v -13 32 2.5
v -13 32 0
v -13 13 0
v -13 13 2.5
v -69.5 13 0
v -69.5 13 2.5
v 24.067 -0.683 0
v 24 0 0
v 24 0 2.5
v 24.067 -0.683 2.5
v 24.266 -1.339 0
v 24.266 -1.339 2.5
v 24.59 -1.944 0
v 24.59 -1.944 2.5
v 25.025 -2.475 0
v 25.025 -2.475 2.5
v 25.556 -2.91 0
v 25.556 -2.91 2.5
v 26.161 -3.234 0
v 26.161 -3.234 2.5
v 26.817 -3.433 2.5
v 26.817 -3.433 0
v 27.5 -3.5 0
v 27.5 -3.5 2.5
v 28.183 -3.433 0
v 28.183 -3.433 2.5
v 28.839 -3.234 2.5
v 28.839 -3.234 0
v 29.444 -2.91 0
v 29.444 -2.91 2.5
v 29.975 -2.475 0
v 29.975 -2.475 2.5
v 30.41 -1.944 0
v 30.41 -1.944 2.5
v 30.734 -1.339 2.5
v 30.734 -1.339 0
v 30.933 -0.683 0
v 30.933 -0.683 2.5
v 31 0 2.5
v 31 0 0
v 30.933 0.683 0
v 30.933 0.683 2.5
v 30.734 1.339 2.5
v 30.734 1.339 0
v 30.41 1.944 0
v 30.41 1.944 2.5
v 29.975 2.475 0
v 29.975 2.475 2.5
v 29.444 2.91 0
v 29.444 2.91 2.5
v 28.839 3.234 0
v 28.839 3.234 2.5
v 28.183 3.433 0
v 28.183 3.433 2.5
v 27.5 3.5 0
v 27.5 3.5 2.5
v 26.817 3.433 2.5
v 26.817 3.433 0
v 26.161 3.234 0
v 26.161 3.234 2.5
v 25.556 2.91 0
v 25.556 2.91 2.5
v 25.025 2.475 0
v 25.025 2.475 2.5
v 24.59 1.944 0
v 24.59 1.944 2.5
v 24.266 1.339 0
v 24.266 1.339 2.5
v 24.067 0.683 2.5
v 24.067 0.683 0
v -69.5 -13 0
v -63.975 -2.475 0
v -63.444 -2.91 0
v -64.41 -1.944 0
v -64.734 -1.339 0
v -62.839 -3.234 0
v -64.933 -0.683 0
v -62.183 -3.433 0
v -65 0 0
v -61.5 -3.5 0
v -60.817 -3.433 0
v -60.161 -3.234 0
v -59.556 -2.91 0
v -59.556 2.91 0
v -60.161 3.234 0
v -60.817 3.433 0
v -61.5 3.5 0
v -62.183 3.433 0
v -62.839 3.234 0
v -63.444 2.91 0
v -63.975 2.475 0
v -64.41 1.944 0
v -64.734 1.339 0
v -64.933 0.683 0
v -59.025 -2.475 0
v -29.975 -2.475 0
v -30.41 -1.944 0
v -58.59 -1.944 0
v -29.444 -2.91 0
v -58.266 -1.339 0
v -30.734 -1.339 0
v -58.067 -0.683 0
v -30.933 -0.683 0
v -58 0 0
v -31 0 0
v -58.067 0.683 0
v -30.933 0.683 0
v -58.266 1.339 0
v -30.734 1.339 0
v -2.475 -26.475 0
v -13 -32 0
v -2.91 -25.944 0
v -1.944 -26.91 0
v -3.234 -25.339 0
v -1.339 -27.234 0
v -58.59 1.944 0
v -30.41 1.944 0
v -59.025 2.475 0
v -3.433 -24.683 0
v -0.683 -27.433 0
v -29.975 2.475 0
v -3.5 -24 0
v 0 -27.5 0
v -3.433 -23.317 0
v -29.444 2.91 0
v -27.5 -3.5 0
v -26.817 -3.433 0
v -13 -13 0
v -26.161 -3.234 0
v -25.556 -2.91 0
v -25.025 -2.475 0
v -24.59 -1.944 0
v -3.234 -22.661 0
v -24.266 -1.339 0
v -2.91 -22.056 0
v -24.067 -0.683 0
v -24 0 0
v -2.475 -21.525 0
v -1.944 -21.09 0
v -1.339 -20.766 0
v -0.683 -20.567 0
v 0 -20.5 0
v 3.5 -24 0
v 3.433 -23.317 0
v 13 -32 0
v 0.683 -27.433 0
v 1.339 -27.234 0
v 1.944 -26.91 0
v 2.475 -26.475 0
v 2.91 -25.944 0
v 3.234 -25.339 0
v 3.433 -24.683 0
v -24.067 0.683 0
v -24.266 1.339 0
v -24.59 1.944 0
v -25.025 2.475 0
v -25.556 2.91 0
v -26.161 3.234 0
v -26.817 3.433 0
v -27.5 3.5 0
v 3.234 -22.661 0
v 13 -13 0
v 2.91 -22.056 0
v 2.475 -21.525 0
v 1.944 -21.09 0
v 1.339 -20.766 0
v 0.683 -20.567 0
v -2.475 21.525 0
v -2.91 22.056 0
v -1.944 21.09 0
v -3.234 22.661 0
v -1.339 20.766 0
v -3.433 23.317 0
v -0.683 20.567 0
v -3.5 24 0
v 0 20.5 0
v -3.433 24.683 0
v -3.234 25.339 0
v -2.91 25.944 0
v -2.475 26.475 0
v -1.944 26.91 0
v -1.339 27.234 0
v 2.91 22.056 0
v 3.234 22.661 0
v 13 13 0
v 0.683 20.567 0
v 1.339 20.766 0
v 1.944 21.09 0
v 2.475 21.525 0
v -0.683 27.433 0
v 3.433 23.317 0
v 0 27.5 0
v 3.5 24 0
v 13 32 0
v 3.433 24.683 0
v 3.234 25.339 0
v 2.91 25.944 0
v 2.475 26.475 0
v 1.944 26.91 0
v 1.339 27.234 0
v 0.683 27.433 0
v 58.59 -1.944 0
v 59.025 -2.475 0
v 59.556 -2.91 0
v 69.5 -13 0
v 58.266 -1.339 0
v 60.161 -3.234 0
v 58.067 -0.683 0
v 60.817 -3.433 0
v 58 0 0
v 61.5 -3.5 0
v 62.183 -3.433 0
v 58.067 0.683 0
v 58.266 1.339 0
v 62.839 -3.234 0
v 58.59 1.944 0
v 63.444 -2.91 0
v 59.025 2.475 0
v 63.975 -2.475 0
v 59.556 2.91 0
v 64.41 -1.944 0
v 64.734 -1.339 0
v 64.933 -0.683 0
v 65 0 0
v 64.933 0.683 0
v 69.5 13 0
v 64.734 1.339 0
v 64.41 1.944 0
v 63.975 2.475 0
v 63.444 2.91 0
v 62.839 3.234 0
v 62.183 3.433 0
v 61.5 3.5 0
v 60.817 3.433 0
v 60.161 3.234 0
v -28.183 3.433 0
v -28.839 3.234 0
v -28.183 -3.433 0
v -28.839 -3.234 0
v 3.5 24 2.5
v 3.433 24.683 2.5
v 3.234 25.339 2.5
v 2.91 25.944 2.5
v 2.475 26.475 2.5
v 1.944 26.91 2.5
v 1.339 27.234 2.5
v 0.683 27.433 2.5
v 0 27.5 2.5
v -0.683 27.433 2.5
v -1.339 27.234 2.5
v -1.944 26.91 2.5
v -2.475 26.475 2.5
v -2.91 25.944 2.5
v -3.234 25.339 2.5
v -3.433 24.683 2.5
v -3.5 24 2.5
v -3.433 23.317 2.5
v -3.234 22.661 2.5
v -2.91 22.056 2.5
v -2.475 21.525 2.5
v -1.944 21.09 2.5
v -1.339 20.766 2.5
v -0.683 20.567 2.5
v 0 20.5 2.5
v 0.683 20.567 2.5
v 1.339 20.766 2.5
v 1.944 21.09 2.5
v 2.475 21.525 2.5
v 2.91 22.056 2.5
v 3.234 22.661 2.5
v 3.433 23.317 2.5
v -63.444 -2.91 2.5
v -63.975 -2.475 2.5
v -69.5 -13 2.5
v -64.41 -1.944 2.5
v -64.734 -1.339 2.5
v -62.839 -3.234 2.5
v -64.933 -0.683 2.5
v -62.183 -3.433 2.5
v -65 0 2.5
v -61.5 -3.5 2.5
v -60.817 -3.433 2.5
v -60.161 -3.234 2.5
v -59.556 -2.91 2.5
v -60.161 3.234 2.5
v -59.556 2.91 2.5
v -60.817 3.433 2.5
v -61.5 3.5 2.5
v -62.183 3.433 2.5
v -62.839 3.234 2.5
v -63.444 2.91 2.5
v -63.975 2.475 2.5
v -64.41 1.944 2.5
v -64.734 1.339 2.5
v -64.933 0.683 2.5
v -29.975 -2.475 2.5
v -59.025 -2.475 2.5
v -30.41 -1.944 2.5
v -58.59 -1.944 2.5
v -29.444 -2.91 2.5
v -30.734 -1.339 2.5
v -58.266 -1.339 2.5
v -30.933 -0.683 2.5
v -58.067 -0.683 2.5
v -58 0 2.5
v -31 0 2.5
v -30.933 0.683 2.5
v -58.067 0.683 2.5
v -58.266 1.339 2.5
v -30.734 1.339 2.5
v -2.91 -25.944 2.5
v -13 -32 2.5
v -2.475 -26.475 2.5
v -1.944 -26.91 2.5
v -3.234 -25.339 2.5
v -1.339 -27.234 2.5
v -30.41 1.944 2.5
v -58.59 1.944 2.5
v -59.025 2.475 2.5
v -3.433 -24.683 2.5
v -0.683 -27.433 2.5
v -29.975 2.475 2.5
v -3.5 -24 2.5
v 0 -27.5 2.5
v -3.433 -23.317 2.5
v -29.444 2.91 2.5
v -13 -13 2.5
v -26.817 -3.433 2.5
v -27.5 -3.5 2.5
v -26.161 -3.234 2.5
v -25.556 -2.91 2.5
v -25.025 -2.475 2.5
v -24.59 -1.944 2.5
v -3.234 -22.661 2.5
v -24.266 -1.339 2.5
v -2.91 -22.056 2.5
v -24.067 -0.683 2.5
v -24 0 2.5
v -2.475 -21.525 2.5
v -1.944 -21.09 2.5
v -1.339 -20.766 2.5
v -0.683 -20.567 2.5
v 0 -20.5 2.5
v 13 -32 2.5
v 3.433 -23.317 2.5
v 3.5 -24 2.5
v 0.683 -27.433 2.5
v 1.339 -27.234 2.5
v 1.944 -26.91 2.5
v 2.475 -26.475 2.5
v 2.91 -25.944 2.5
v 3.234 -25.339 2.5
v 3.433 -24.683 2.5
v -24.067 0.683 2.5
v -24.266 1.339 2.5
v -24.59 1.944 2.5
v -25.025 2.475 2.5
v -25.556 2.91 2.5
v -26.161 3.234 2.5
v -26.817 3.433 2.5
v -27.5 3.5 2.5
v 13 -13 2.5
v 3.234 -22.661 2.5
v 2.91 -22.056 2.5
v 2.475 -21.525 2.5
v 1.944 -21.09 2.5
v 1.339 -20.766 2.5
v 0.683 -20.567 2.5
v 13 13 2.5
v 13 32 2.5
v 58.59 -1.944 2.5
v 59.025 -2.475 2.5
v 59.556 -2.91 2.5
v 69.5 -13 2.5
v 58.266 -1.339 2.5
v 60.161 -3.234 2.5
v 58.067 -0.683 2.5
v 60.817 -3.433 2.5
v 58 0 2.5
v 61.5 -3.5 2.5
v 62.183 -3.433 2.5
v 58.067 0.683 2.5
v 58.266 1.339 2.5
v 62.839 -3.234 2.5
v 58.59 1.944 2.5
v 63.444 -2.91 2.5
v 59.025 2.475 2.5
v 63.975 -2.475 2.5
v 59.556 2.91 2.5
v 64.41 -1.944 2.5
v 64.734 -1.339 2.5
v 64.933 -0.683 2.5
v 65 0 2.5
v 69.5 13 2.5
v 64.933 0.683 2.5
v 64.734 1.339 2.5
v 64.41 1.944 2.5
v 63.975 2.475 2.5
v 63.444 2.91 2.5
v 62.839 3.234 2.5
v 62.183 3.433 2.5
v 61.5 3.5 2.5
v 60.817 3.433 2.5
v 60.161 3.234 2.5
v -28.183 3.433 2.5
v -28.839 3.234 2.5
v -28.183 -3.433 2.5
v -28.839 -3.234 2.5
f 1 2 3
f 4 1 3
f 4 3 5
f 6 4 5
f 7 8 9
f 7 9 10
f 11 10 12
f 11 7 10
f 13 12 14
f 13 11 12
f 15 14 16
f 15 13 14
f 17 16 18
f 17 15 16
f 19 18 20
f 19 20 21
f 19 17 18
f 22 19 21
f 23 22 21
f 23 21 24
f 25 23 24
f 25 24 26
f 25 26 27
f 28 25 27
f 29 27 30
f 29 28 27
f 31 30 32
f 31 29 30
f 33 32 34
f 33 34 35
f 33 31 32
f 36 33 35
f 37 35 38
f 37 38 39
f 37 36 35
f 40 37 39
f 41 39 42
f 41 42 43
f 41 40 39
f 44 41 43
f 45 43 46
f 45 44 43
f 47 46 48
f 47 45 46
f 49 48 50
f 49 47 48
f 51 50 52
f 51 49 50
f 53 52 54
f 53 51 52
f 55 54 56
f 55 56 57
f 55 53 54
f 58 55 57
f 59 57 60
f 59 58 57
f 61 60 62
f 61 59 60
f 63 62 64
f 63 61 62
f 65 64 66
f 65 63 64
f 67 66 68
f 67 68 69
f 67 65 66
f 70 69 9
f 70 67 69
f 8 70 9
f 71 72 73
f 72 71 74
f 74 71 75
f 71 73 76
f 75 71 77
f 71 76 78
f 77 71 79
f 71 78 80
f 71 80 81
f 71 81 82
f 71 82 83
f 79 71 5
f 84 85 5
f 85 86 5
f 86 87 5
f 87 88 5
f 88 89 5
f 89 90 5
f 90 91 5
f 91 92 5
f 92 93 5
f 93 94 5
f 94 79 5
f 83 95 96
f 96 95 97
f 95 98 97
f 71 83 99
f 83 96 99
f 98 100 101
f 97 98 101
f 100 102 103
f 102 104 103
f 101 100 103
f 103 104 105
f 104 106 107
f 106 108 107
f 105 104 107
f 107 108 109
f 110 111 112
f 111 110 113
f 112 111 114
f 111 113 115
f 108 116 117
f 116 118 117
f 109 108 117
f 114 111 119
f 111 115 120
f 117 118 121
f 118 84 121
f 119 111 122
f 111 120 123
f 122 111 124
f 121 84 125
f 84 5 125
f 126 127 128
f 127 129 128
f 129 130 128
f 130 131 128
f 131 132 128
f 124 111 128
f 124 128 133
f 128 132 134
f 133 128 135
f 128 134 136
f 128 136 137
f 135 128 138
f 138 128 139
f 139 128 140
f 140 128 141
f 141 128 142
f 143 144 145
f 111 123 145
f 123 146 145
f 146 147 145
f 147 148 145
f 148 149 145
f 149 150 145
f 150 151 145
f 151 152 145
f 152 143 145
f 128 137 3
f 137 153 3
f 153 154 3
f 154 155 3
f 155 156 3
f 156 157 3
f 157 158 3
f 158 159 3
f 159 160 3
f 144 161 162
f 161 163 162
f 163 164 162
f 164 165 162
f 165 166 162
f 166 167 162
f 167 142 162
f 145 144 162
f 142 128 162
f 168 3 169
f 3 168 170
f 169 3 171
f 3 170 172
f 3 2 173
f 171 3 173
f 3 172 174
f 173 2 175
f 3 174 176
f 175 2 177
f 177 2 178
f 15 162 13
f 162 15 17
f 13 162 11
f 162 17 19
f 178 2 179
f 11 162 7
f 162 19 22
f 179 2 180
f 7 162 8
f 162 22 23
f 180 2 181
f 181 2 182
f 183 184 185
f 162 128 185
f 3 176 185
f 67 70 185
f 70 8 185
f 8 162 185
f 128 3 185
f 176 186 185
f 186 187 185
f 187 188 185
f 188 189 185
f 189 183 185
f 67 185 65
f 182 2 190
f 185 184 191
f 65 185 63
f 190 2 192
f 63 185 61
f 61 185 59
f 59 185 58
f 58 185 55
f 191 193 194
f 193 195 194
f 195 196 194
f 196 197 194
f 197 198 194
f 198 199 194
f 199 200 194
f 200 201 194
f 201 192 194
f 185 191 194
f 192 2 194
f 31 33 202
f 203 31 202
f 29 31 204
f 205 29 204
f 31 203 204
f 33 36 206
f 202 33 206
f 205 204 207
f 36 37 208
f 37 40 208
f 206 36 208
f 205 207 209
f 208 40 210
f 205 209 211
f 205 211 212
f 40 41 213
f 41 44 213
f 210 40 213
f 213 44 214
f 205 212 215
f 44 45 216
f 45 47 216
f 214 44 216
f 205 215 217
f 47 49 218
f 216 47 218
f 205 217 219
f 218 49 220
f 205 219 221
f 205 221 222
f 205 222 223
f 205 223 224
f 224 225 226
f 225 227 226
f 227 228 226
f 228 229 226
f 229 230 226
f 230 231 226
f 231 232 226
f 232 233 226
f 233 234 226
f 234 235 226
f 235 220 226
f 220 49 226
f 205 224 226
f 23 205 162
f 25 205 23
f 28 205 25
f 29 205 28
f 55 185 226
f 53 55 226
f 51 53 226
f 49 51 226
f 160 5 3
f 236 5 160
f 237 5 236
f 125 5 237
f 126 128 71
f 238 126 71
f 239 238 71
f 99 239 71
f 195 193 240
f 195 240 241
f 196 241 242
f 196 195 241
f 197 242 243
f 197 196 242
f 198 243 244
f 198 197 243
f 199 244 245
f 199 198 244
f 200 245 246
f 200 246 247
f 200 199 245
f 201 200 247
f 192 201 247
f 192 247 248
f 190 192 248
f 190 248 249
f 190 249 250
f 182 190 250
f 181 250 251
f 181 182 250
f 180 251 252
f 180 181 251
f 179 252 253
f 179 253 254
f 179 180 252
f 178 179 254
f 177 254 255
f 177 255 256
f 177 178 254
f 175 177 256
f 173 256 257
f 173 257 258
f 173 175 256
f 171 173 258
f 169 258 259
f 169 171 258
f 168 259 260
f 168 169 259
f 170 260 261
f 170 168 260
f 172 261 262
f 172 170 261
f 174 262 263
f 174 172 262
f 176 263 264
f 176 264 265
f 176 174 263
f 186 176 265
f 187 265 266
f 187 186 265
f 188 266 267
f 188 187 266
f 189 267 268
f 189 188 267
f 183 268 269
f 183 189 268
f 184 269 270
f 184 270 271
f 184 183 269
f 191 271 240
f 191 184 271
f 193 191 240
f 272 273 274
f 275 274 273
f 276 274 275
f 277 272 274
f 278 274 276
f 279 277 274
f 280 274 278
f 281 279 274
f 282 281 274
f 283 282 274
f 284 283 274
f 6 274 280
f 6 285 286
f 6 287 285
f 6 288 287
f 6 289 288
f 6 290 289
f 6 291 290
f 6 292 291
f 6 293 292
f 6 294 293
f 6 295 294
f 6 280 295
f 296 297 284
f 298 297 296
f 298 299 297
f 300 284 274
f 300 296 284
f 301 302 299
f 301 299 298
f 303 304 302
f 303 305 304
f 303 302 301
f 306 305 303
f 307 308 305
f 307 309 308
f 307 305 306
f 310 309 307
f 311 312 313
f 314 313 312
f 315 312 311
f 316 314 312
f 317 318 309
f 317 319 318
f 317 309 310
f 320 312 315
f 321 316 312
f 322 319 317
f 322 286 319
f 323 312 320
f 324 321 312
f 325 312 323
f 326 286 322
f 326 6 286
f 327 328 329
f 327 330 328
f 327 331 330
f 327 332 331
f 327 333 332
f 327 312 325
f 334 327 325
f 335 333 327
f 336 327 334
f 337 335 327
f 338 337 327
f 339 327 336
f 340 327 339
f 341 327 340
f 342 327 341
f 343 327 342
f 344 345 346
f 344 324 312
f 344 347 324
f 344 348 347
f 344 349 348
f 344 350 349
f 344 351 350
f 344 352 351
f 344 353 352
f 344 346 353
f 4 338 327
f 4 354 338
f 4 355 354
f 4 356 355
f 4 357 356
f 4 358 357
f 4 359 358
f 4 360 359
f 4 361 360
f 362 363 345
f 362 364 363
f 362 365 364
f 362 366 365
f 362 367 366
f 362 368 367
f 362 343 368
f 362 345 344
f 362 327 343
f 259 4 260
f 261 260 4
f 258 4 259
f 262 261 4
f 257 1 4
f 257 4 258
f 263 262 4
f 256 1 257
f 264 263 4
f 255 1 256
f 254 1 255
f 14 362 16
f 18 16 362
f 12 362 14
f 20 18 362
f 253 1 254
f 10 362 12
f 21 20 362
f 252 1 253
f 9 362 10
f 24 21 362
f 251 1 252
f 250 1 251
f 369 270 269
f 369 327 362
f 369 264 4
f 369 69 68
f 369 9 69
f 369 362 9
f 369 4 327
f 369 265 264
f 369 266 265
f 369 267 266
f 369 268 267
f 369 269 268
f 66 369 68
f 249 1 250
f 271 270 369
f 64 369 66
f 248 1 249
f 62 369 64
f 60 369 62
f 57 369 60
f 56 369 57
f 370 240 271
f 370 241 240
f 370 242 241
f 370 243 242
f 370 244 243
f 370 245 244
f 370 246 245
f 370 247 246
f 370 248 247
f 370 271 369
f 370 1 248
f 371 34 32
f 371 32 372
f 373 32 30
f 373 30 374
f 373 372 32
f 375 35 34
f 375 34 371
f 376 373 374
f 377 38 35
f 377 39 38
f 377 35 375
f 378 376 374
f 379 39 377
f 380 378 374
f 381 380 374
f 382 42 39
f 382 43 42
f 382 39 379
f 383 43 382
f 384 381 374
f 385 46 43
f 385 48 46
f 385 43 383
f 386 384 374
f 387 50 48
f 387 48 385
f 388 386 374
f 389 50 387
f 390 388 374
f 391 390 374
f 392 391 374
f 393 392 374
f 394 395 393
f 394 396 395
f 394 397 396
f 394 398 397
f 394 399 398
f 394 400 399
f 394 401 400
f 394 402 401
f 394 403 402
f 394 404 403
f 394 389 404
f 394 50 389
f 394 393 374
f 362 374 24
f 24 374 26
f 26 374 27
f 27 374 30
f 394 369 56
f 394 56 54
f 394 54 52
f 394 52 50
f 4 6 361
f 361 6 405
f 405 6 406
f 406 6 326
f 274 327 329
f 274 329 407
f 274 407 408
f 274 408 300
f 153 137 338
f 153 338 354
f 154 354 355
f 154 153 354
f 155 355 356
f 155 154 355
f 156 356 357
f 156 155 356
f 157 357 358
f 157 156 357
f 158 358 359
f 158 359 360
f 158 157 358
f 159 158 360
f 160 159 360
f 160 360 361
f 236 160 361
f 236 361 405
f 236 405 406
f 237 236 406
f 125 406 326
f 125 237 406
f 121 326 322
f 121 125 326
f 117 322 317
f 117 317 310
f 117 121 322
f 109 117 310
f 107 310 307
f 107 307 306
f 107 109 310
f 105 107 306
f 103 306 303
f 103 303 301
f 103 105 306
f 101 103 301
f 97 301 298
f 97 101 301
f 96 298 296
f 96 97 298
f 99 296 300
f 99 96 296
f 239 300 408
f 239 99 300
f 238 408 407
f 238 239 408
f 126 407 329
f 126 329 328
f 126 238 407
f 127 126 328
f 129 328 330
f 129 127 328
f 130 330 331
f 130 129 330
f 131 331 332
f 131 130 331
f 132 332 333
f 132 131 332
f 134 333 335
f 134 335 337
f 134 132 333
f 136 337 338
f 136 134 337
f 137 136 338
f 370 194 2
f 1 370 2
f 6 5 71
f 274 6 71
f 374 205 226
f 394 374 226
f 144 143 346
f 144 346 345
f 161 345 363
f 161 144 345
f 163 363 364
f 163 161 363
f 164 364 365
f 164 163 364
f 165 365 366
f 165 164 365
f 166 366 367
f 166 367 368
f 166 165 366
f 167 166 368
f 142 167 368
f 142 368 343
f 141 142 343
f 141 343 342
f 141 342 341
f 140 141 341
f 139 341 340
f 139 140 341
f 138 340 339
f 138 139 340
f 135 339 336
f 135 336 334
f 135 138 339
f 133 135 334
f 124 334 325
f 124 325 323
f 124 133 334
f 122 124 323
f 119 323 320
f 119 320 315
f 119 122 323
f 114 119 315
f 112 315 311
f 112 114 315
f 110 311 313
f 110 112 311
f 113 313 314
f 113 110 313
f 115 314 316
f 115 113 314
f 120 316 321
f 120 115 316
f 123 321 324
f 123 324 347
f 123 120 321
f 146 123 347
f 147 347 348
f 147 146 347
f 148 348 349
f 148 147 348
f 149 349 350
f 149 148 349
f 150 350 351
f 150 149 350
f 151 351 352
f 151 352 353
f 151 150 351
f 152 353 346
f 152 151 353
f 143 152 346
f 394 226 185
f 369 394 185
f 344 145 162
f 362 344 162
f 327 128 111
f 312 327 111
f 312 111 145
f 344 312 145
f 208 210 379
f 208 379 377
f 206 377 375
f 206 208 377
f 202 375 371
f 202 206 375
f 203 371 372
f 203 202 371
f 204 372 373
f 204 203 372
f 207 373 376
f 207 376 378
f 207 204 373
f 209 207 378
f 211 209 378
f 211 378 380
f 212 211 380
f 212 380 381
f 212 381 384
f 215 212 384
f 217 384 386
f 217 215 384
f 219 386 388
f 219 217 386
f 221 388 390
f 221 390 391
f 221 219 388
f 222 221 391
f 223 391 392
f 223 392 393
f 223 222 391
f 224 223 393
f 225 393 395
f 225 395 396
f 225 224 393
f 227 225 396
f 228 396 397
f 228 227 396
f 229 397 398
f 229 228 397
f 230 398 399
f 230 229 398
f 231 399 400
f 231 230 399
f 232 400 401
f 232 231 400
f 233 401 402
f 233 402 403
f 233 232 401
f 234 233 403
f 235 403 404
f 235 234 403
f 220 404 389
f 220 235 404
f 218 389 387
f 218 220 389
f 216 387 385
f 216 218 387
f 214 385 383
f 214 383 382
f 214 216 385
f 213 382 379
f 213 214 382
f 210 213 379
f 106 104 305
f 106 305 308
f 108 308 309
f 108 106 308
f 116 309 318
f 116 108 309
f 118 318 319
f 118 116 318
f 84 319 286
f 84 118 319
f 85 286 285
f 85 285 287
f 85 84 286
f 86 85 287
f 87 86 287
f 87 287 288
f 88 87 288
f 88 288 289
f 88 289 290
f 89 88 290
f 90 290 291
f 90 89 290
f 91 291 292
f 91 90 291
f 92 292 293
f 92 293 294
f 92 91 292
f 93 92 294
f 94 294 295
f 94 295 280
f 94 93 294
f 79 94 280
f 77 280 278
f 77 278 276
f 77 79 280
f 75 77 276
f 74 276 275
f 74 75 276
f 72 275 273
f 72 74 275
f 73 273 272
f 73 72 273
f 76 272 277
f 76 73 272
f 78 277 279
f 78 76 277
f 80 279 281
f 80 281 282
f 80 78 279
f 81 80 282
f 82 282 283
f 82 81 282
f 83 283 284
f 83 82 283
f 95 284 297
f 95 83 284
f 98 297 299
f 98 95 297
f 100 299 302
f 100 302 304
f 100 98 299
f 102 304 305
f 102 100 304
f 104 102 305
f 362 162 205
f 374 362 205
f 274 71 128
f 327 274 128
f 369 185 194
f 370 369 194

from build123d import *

# Parameters (mm, degrees)
SKETCH_1_R      = 3.5
EXTRUDE_1_DEPTH = 2.5


with BuildPart() as part:
    # Эскиз1 → Бобышка-Вытянуть1 (new body)
    with BuildSketch(Plane.XY):
        Polygon((13, -13), (69.5, -13), (69.5, 13), (13, 13), (13, 32), (-13, 32), (-13, 13), (-69.5, 13), (-69.5, -13), (-13, -13), (-13, -32), (13, -32), align=None)
        with Locations((0, 24)):
            Circle(SKETCH_1_R, mode=Mode.SUBTRACT)
        with Locations((0, -24)):
            Circle(SKETCH_1_R, mode=Mode.SUBTRACT)
        with Locations((-61.5, 0)):
            Circle(SKETCH_1_R, mode=Mode.SUBTRACT)
        with Locations((-27.5, 0)):
            Circle(SKETCH_1_R, mode=Mode.SUBTRACT)
        with Locations(Location((27.5, 0, 0), (0, 0, 180))):  # turned: the seam where the file's is
            Circle(SKETCH_1_R, mode=Mode.SUBTRACT)
        with Locations(Location((61.5, 0, 0), (0, 0, 180))):  # turned: the seam where the file's is
            Circle(SKETCH_1_R, mode=Mode.SUBTRACT)
    extrude(amount=EXTRUDE_1_DEPTH)


solid = part.part
